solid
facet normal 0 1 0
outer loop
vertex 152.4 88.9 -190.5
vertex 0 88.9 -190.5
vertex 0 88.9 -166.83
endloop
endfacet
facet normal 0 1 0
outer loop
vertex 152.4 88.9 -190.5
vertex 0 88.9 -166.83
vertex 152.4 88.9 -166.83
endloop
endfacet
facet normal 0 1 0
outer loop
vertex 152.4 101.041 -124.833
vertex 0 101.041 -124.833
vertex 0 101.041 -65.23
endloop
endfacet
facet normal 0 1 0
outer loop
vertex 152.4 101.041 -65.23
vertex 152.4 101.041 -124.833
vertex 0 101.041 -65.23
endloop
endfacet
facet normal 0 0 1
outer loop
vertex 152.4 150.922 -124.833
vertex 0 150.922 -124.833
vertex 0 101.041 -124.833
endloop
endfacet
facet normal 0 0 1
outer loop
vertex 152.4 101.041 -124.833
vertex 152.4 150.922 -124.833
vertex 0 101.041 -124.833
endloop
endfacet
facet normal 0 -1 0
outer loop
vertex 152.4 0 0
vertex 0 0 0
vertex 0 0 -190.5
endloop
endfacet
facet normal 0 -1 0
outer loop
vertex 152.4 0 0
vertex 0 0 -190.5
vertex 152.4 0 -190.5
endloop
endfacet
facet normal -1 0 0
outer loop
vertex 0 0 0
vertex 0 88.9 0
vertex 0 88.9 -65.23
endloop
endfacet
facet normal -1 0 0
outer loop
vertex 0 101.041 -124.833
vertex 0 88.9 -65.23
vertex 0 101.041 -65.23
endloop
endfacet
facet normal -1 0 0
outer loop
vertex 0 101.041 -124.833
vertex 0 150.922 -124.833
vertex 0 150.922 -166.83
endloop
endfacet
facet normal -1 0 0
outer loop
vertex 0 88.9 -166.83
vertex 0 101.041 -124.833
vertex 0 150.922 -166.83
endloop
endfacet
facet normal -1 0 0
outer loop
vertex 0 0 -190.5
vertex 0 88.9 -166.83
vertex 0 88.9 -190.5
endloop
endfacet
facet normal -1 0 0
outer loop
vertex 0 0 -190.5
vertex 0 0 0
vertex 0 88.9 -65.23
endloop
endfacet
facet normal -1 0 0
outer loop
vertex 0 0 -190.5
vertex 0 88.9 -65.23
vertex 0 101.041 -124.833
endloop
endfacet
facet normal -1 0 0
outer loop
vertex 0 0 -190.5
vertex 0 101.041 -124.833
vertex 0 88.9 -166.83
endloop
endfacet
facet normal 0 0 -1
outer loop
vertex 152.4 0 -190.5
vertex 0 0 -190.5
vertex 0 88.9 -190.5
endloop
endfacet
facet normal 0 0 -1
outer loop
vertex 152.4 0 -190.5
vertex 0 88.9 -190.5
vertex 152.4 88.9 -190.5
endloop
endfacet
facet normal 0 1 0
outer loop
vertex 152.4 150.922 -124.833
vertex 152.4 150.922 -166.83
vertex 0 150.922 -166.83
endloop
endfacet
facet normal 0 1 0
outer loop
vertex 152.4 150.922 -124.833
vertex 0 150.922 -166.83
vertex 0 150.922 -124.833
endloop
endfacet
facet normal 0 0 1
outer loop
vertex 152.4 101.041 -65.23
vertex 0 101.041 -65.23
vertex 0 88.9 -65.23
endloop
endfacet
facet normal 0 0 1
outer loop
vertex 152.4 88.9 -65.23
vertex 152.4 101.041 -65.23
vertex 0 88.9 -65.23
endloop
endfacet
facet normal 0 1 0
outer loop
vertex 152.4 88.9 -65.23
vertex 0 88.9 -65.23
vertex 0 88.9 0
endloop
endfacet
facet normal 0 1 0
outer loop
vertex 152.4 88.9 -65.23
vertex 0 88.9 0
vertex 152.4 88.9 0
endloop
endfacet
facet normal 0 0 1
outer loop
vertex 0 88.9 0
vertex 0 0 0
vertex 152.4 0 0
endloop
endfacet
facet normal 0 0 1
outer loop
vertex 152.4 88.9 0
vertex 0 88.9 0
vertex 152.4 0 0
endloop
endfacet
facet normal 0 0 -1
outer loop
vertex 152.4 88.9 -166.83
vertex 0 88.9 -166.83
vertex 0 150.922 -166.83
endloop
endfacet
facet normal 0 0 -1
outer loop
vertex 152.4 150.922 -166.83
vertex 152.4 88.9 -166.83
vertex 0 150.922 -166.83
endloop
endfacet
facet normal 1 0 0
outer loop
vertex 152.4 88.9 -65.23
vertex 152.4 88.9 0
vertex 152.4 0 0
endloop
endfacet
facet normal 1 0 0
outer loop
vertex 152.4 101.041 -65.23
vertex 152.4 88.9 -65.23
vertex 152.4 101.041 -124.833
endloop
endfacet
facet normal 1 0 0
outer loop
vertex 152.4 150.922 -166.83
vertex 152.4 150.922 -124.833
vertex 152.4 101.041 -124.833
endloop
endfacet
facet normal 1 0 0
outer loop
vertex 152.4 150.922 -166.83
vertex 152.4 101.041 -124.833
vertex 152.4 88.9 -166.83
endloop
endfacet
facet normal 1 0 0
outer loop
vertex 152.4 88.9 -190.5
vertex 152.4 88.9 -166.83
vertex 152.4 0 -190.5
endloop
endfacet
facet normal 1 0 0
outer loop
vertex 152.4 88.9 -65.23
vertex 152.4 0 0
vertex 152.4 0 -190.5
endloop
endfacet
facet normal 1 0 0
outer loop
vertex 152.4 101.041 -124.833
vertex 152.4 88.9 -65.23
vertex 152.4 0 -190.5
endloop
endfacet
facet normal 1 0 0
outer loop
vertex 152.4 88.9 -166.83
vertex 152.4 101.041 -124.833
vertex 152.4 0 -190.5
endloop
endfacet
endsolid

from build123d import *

# Parameters (mm, degrees)
SKETCH1_W           = 152.4
SKETCH1_H           = 190.5
BOSS_EXTRUDE1_DEPTH = 88.9
BOSS_EXTRUDE2_DEPTH = 152.4


with BuildPart() as part:
    # Sketch1 → Boss-Extrude1 (new body)
    with BuildSketch(Plane(origin=(0, 0, 0), x_dir=(1, 0, 0), z_dir=(0, 1, 0))):
        with Locations((76.2, 95.25)):
            Rectangle(SKETCH1_W, SKETCH1_H)
    extrude(amount=BOSS_EXTRUDE1_DEPTH)

    # Sketch2 → Boss-Extrude2 (add)
    with BuildSketch(Plane(origin=(0, 0, 0), x_dir=(0, 0, -1), z_dir=(1, 0, 0))):
        Polygon((65.22974, 88.9), (166.82974, 88.9), (166.82974, 150.92172), (124.83338, 150.92172), (124.83338, 101.0412), (65.22974, 101.0412), align=None)
    extrude(amount=BOSS_EXTRUDE2_DEPTH)


solid = part.part
